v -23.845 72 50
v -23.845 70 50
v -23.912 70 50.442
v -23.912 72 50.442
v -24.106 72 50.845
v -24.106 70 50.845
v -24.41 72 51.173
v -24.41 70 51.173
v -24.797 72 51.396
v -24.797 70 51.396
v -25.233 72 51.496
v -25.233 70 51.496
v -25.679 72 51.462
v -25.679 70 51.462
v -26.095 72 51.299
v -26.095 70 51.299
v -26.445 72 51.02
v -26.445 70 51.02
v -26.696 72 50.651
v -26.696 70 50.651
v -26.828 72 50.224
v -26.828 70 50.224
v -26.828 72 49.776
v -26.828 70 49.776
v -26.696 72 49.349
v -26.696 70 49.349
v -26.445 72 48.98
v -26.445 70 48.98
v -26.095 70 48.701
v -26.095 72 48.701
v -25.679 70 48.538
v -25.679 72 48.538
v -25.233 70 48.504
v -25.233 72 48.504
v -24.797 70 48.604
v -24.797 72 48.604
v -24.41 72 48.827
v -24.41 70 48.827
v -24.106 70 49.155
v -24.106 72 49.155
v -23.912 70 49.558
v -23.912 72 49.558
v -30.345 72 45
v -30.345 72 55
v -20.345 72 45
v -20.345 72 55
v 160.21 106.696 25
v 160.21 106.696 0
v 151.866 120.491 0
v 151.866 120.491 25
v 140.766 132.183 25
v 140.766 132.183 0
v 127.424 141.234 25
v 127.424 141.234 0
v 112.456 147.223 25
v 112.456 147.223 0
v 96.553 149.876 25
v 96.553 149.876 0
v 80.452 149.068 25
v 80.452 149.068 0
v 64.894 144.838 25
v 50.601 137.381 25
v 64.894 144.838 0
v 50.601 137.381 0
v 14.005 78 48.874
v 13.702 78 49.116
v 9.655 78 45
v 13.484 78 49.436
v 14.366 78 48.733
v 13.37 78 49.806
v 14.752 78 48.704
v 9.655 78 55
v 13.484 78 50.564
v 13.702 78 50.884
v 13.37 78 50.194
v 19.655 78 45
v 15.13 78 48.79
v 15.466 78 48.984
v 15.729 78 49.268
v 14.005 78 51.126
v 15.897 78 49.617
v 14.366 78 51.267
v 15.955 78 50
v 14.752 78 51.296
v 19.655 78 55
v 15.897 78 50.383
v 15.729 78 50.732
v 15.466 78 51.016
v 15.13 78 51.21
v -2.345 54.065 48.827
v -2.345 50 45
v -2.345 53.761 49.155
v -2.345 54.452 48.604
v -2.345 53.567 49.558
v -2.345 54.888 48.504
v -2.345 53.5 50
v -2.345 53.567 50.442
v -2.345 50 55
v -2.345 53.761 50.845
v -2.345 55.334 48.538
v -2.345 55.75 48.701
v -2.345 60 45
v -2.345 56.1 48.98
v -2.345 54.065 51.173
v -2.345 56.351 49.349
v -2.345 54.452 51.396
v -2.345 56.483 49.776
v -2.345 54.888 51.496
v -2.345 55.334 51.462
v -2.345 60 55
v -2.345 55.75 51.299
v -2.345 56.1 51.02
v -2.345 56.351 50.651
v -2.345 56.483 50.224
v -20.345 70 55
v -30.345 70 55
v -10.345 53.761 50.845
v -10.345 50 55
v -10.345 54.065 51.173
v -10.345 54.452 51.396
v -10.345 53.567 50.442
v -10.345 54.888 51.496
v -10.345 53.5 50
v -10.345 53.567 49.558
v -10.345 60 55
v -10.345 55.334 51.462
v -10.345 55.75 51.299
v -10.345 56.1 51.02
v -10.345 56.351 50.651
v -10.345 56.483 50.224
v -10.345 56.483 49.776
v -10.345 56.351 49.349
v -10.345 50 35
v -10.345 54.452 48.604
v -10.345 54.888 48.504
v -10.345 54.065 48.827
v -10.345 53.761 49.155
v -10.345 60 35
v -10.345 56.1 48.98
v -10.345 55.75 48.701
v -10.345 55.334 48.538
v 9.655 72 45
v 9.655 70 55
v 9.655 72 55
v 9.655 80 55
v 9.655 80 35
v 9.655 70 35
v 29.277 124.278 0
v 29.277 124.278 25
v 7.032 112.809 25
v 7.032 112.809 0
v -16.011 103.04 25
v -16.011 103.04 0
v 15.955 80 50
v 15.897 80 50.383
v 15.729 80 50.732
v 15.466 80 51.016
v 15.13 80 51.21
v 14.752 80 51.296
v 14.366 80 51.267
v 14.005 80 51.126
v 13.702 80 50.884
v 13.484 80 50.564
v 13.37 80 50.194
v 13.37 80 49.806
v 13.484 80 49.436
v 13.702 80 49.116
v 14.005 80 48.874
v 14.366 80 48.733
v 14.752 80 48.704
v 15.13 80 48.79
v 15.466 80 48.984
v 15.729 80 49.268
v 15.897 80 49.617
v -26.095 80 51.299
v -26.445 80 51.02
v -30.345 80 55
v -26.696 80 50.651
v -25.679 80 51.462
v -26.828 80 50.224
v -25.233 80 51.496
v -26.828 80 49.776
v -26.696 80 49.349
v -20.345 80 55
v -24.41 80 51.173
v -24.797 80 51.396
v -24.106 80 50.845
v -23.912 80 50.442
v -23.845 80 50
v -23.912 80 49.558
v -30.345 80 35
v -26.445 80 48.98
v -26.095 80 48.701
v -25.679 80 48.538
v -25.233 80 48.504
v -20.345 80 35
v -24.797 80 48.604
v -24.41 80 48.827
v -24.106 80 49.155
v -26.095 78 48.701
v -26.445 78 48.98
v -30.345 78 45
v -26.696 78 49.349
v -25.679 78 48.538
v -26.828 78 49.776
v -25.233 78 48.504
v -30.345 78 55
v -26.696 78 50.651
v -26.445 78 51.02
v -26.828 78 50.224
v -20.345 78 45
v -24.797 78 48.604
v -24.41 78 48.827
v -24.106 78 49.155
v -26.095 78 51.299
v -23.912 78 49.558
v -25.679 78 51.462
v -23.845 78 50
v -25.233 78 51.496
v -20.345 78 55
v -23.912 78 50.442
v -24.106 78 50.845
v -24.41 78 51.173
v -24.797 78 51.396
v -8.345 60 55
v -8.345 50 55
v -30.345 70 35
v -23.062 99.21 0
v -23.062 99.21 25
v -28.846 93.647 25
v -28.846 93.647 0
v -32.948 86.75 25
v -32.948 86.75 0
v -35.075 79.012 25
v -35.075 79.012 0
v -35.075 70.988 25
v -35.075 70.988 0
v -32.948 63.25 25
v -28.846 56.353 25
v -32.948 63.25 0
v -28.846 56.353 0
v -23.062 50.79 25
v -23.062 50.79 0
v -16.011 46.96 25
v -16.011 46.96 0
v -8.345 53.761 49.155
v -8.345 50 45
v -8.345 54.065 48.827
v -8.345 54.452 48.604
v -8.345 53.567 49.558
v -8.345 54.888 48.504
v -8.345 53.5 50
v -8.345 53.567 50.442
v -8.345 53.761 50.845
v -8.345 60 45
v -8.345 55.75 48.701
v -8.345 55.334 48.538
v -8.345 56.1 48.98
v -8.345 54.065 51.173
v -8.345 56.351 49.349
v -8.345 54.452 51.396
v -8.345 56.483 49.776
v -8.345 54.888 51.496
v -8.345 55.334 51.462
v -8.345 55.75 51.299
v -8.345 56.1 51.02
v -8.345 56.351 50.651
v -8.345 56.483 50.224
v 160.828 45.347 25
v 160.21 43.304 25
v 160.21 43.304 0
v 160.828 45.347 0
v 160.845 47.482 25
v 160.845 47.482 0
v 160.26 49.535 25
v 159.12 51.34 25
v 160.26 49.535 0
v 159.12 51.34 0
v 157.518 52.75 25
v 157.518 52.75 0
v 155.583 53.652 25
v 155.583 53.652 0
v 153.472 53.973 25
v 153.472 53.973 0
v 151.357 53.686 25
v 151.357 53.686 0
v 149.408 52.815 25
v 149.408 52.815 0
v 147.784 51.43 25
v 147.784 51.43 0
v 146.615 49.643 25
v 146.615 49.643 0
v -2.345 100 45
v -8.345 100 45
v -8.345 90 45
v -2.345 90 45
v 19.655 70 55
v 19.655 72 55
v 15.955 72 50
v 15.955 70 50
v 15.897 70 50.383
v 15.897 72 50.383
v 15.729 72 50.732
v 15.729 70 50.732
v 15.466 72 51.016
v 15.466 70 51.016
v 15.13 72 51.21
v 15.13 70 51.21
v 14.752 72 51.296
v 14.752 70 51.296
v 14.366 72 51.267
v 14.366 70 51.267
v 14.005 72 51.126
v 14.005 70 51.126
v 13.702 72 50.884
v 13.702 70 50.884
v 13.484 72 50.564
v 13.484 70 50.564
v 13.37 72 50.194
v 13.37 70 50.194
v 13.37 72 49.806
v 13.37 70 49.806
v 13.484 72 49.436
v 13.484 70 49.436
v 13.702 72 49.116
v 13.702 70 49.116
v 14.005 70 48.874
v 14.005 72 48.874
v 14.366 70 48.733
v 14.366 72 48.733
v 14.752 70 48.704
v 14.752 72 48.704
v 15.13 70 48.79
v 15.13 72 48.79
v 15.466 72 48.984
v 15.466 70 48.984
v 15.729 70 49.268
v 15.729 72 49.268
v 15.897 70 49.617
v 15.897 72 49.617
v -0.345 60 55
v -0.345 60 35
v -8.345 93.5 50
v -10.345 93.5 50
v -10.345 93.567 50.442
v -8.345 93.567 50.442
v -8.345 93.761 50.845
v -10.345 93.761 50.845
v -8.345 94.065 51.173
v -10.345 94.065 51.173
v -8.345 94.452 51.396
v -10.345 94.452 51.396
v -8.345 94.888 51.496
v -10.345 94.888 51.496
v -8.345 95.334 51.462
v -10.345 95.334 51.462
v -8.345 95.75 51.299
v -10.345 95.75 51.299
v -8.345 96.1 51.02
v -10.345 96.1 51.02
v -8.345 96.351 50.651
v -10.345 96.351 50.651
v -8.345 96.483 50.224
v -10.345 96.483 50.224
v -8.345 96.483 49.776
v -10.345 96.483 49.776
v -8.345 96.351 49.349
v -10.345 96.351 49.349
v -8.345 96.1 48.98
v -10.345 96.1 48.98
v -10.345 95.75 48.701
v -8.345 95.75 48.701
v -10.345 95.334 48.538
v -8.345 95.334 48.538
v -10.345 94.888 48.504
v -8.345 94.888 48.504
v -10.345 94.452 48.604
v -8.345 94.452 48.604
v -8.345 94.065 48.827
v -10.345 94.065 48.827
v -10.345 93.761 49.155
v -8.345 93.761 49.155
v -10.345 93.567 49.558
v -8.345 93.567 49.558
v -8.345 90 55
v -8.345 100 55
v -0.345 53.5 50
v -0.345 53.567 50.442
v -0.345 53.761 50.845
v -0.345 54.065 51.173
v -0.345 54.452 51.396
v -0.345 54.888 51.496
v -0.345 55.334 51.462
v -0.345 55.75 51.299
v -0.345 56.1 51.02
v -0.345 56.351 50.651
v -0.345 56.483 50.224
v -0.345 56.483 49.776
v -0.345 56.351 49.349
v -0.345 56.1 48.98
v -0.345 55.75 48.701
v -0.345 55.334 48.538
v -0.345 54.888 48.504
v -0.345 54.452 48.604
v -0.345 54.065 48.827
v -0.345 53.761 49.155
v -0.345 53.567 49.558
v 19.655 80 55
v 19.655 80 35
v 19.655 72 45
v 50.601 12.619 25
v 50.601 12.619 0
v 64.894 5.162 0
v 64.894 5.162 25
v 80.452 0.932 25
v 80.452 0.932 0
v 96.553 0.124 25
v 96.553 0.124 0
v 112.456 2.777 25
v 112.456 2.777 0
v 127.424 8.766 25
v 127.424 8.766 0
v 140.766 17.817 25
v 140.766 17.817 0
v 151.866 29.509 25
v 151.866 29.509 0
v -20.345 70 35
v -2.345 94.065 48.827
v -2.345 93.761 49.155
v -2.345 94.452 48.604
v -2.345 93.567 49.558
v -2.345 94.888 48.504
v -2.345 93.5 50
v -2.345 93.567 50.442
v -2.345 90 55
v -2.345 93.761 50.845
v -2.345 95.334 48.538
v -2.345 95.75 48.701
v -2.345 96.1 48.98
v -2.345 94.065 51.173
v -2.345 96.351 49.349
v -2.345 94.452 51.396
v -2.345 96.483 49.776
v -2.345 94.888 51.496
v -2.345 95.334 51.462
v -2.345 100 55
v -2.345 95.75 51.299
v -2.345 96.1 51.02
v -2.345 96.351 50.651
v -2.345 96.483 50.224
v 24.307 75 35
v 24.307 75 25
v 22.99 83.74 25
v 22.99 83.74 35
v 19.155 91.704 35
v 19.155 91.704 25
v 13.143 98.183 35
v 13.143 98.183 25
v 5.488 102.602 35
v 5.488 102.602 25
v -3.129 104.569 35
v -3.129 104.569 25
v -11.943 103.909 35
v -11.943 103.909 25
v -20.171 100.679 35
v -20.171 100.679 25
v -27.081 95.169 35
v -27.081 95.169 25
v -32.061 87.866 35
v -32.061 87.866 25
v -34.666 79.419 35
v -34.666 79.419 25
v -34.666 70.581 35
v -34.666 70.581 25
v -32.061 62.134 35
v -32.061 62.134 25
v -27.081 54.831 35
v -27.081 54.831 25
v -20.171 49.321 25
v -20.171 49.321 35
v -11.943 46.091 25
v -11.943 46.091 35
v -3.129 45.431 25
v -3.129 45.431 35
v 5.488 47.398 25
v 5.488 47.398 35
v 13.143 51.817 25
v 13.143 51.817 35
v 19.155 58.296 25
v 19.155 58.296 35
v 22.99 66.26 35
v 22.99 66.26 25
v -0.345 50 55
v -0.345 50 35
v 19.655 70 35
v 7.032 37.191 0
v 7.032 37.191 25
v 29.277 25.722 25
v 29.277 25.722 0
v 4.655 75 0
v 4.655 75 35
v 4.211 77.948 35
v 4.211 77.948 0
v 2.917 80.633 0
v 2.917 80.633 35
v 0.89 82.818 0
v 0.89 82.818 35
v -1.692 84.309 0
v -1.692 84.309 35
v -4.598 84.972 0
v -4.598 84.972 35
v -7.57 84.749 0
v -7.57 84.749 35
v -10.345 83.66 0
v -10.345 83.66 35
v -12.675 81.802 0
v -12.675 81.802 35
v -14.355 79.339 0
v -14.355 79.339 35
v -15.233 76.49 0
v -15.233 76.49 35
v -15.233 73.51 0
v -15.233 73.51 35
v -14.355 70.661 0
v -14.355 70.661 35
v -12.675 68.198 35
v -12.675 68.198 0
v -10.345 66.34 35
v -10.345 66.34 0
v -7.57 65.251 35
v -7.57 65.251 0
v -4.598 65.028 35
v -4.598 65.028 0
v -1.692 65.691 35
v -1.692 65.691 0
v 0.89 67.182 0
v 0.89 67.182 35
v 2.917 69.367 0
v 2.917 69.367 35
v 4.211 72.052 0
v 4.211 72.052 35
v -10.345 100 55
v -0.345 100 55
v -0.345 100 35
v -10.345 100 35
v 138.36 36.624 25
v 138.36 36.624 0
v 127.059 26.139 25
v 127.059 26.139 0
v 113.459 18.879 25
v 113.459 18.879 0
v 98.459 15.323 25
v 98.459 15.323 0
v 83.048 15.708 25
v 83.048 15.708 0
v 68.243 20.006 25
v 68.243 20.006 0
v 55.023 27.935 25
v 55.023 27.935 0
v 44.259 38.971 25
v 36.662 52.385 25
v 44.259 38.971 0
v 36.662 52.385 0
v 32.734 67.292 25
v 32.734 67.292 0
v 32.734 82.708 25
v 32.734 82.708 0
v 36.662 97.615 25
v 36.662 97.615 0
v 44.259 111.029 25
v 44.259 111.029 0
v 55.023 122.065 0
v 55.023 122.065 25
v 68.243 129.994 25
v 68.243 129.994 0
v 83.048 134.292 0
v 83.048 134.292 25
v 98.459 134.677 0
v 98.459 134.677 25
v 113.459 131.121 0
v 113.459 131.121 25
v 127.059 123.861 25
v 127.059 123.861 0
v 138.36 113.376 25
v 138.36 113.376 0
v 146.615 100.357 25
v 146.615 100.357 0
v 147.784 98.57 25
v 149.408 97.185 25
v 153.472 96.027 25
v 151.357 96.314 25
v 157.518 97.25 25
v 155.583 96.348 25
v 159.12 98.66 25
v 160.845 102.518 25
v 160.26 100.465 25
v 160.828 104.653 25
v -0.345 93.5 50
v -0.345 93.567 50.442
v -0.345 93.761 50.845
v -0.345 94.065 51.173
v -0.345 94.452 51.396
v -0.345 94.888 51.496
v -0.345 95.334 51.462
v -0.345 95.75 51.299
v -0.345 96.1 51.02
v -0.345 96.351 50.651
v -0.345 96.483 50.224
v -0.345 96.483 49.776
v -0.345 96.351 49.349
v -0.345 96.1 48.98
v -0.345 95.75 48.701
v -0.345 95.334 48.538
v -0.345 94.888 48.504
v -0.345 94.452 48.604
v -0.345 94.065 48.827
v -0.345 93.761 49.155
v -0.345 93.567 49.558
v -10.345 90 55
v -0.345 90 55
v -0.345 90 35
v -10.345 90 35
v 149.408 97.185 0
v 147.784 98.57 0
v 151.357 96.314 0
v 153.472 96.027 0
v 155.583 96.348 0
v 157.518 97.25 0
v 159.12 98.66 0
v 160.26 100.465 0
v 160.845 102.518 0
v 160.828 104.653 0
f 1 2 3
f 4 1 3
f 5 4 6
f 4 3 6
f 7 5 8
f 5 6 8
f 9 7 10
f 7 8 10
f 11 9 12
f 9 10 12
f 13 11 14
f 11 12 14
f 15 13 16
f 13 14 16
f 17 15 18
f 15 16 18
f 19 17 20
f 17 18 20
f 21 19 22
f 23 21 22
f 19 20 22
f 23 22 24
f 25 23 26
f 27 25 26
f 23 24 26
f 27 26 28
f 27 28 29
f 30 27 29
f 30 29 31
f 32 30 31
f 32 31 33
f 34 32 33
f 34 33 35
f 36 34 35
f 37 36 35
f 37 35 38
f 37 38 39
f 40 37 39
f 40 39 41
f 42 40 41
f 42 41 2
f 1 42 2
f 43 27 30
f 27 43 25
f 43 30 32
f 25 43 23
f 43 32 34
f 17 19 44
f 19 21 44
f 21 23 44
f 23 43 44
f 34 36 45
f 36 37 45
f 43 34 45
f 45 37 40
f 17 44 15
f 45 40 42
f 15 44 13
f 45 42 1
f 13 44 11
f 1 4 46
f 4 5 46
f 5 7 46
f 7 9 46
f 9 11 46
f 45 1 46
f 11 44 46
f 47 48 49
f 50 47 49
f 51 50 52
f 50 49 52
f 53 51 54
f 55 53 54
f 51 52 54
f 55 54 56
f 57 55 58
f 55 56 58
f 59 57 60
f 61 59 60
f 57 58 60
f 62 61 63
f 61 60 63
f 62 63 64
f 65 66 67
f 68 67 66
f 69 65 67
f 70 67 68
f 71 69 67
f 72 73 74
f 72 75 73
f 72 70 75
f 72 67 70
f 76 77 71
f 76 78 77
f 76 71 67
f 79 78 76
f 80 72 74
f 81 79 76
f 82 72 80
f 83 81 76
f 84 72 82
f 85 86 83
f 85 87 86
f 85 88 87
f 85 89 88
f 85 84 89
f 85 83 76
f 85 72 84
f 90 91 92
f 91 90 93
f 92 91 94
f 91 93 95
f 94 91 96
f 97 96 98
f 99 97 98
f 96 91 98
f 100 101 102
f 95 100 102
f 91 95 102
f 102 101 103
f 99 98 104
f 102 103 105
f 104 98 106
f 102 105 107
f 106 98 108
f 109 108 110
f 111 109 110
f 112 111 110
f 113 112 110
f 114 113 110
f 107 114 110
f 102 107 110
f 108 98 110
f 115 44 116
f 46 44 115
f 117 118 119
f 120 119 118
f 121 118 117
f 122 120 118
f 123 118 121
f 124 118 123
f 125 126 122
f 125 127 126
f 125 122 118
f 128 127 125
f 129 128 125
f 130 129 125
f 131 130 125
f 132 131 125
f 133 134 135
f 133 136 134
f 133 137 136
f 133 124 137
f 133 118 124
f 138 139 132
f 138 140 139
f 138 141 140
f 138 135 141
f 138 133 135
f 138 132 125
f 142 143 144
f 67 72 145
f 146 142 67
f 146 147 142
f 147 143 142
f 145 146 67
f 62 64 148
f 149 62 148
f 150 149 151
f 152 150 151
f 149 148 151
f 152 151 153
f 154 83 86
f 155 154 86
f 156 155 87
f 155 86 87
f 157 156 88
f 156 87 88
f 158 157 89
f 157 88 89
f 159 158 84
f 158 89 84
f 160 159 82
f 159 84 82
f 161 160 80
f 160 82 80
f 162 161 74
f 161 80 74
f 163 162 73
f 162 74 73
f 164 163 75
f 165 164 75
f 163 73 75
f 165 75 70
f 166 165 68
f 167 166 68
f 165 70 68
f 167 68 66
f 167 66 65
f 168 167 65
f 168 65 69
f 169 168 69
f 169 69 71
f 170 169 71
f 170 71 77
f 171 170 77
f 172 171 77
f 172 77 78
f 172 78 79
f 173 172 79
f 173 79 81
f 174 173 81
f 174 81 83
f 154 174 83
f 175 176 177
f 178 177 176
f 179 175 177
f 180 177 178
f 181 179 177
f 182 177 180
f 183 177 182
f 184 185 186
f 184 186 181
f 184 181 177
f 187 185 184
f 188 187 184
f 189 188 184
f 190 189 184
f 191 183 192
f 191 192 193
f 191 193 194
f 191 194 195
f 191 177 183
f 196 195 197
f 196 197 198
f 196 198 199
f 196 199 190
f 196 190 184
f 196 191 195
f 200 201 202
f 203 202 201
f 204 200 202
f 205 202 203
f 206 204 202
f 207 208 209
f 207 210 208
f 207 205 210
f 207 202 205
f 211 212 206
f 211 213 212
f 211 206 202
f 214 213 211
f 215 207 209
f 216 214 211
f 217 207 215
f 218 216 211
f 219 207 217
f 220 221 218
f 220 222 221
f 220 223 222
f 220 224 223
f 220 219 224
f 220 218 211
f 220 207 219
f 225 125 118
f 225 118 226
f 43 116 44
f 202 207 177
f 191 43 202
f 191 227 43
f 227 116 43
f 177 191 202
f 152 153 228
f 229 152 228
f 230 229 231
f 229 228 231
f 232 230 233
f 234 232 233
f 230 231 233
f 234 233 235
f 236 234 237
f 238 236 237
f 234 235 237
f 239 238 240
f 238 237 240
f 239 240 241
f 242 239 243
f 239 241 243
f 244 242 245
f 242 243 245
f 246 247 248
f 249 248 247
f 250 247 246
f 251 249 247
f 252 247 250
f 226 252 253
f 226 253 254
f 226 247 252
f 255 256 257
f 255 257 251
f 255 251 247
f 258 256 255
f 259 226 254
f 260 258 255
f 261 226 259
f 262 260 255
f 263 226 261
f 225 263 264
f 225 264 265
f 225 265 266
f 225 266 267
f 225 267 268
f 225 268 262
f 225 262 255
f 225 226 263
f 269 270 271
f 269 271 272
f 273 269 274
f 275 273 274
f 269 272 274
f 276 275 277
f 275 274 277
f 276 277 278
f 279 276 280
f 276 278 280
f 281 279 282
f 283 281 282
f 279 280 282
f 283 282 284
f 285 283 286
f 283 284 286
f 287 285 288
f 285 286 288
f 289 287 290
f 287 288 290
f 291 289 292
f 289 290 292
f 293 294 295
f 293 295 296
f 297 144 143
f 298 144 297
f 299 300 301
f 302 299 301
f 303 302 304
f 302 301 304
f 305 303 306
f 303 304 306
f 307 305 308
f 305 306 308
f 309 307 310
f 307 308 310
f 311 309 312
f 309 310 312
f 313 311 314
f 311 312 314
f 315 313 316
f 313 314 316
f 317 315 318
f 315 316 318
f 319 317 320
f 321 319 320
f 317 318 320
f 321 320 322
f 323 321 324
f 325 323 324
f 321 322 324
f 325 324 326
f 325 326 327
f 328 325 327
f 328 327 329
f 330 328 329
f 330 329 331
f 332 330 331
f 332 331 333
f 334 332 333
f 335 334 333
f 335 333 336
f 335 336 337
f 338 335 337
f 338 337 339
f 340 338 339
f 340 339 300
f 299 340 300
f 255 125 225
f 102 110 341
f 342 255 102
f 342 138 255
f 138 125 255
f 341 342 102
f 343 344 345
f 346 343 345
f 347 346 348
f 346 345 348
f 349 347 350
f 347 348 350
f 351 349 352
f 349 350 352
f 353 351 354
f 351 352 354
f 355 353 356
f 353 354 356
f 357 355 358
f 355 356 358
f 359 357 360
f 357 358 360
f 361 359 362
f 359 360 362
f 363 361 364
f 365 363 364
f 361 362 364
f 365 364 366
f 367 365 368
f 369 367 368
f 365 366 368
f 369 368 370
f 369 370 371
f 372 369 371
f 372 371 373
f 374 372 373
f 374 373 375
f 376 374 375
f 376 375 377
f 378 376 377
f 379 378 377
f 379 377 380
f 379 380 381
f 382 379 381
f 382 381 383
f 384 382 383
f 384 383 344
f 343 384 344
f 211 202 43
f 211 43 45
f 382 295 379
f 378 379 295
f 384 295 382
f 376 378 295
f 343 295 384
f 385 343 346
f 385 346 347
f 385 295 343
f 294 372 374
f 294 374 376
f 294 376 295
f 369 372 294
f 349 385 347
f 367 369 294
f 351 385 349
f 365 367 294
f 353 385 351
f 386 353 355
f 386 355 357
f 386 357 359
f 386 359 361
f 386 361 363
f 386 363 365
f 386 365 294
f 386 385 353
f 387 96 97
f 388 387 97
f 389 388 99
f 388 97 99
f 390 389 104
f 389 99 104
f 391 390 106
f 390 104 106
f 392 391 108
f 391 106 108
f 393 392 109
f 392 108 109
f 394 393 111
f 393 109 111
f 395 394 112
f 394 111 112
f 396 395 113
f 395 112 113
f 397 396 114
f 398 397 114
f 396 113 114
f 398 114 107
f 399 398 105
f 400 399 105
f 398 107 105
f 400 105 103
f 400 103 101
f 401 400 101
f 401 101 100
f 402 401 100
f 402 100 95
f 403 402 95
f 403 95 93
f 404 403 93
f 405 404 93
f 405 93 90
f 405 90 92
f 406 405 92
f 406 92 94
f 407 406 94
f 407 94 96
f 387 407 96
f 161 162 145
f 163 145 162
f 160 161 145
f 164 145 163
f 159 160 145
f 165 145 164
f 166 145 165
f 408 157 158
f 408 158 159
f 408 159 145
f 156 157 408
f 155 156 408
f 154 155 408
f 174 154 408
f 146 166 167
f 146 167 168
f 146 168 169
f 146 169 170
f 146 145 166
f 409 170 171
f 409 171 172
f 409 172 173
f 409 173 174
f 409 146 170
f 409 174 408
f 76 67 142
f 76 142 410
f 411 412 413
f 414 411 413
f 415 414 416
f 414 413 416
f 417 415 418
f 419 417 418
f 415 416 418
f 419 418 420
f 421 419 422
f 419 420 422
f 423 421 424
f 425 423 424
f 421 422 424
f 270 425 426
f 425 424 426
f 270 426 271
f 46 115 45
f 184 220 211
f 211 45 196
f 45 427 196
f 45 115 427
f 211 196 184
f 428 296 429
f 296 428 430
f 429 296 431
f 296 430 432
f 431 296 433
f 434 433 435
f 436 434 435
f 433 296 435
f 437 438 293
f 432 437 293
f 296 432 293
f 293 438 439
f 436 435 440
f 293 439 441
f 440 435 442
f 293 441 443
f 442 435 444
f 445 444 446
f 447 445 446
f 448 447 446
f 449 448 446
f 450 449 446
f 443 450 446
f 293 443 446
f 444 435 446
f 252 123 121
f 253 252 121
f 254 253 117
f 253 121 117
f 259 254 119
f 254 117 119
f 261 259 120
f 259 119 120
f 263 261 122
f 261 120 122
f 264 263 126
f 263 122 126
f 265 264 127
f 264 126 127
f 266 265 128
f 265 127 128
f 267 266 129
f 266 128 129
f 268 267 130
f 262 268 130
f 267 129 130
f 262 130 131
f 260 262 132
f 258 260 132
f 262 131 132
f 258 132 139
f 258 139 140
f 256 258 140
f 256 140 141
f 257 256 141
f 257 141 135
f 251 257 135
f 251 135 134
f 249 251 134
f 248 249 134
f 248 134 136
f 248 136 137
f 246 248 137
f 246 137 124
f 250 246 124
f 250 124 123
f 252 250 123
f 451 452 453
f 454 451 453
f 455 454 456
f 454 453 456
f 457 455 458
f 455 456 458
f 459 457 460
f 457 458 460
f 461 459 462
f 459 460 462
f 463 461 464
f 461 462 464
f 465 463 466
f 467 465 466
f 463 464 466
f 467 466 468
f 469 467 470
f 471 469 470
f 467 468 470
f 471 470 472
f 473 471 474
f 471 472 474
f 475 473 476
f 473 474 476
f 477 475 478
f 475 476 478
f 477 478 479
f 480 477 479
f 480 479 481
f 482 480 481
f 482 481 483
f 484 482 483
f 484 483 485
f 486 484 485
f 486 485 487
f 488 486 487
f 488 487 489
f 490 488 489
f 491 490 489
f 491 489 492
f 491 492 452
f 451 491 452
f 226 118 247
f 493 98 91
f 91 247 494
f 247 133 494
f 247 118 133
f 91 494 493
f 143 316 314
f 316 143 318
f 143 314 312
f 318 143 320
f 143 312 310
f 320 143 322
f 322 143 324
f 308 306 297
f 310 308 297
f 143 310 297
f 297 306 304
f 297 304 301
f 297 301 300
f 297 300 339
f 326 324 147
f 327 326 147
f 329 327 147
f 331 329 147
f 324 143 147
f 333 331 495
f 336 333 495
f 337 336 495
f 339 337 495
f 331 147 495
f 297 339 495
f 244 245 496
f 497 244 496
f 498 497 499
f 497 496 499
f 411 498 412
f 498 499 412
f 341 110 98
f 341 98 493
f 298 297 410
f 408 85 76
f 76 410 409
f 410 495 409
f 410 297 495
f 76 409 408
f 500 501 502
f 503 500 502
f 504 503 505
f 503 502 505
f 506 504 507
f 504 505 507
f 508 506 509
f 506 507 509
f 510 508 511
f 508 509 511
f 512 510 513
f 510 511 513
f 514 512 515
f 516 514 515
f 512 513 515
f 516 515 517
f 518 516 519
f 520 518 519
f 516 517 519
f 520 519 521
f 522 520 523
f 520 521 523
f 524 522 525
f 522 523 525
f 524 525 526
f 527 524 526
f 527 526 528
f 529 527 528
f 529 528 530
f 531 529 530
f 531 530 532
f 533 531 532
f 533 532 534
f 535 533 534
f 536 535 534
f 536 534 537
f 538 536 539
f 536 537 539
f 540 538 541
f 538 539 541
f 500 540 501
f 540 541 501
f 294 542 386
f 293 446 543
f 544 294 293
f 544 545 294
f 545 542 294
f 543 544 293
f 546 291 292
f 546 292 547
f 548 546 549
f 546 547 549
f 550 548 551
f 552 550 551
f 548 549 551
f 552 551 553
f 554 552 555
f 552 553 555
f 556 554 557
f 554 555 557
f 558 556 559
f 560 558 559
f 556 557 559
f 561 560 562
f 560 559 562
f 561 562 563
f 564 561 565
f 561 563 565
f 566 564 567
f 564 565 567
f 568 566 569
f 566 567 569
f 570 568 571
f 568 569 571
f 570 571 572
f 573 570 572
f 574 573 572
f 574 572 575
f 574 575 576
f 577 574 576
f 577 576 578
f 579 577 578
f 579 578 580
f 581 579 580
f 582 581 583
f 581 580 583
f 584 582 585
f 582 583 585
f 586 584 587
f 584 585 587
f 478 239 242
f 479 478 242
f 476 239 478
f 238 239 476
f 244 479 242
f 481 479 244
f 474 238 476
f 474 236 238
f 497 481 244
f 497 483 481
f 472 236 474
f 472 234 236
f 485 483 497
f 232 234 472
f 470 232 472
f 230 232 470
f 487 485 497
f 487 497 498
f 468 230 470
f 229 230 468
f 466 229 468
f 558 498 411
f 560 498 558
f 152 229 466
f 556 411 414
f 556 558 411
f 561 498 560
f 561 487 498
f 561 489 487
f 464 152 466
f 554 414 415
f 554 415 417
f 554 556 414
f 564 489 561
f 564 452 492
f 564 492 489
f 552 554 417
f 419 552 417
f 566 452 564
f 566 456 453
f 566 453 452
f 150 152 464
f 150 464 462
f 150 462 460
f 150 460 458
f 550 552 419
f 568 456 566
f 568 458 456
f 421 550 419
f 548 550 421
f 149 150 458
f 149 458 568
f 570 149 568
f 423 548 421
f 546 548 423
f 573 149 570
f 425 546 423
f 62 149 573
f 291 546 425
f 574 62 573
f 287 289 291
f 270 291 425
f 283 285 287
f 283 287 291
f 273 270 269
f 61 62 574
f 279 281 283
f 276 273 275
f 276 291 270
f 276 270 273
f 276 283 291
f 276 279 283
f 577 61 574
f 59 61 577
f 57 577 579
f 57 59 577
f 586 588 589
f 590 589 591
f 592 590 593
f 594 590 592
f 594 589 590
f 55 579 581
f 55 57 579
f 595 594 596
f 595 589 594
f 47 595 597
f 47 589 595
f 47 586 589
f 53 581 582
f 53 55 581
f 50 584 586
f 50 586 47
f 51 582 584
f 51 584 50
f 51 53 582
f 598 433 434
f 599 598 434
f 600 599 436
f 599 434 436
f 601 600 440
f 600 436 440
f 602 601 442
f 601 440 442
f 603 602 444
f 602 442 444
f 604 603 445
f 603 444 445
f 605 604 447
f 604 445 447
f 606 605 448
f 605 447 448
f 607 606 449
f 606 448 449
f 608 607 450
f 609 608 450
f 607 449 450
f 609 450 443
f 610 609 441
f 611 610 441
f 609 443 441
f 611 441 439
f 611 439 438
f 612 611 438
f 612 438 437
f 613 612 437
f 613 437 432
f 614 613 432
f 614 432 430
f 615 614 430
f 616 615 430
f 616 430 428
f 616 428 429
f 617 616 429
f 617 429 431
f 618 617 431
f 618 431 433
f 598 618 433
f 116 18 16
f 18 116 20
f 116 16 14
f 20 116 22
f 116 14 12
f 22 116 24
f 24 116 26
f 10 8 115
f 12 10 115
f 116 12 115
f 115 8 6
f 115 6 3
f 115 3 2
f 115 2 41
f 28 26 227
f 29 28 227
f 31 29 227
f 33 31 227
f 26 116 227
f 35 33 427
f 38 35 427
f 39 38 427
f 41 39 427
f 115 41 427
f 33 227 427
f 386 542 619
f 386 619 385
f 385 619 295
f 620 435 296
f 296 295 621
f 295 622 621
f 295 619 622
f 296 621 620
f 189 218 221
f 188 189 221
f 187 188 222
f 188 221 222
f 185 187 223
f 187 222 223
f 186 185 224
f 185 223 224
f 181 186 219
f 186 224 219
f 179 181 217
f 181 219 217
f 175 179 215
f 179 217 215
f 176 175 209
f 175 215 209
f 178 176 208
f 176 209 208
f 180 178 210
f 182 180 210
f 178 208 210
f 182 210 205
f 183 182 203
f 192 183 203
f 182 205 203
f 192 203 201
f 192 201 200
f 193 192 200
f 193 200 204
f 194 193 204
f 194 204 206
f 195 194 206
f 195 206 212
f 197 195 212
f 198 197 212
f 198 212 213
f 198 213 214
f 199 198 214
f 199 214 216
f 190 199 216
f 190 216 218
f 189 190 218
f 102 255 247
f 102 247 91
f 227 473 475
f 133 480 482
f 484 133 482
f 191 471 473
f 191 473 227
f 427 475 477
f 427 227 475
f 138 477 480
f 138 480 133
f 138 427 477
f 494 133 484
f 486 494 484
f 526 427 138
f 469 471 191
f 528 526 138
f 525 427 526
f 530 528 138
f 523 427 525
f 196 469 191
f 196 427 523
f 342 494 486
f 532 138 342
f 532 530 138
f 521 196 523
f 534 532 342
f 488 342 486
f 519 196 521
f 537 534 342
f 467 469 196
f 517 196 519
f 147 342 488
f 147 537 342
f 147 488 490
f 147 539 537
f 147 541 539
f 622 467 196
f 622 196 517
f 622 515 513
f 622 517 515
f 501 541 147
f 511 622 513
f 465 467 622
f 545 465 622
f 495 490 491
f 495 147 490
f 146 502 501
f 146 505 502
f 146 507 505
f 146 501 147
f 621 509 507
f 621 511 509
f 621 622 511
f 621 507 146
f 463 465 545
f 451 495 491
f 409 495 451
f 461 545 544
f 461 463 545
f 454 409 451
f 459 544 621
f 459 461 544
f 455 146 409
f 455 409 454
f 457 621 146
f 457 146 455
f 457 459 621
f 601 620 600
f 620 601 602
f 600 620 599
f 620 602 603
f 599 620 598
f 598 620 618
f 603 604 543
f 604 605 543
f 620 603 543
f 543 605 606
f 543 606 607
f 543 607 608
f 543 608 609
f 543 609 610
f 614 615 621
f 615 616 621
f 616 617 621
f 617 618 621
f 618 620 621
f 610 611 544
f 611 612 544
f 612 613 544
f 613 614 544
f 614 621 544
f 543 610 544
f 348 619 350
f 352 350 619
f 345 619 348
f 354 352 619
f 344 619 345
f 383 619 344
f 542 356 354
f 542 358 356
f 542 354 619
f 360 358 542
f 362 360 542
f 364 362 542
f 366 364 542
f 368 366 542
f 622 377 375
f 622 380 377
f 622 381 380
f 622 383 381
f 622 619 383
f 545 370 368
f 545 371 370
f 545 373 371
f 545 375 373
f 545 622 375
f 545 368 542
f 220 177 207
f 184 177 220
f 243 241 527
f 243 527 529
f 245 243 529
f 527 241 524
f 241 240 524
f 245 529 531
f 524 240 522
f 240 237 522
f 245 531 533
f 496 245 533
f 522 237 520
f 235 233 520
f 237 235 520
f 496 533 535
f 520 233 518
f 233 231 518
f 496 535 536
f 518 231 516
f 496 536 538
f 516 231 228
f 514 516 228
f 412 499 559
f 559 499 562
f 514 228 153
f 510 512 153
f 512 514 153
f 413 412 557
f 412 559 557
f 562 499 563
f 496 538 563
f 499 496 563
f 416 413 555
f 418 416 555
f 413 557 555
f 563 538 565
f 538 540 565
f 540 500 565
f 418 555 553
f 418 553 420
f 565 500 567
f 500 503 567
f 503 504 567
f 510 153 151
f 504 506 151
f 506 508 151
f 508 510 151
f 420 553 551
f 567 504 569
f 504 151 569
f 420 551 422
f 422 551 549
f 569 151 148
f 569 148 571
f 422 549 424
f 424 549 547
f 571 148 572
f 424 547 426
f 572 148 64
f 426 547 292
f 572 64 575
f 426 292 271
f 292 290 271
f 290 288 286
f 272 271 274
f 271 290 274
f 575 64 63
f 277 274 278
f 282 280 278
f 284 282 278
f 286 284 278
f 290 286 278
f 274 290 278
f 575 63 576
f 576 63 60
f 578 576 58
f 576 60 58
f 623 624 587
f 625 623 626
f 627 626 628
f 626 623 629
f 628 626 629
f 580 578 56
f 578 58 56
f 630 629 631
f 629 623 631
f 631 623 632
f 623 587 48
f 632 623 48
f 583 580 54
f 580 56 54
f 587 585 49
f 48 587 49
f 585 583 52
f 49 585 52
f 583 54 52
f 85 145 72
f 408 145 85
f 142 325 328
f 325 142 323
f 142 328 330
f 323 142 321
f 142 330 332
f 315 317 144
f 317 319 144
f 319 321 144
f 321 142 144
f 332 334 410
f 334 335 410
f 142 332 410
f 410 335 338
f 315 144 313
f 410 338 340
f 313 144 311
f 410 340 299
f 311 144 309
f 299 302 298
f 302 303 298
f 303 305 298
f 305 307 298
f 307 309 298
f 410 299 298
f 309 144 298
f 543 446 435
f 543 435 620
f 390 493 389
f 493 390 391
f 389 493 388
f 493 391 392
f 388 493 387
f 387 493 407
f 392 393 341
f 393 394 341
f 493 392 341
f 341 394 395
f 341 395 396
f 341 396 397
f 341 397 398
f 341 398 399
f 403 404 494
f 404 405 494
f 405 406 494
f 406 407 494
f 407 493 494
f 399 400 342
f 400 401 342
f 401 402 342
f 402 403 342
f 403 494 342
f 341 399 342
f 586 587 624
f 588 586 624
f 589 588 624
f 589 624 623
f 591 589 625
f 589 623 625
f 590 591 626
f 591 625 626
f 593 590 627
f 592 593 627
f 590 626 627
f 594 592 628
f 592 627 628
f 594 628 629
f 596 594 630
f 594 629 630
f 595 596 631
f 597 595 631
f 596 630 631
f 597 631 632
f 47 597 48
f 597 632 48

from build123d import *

# Parameters (mm, degrees)
BOSS_EXTRUDE1_DEPTH = 25
SKETCH1_3_R         = 29.652029199
BOSS_EXTRUDE2_DEPTH = 35
SKETCH3_R           = 10
CUT_EXTRUDE1_DEPTH  = 35
SKETCH4_W           = 10
SKETCH4_H           = 10
BOSS_EXTRUDE3_DEPTH = 20
SKETCH5_W           = 6
SKETCH5_H           = 10
SKETCH5_W_2         = 10
SKETCH5_H_2         = 6
CUT_EXTRUDE2_DEPTH  = 10
SKETCH6_R           = 1.3
SKETCH6_R_2         = 1.5
CUT_EXTRUDE3_DEPTH  = 10
SKETCH7_R           = 1.5
CUT_EXTRUDE4_DEPTH  = 10


with BuildPart() as part:
    # Sketch1 → Boss-Extrude1 (new body)
    with BuildSketch(Plane.XY):
        with BuildLine():
            ThreePointArc((50.600725893, 12.618751535), (112.455741461, 2.776716043), (160.210090254, 43.303630369))
            ThreePointArc((160.210090254, 43.303630369), (156.582418814, 53.270575735), (146.615473448, 49.642904296))
            ThreePointArc((146.615473448, 49.642904296), (32.237006226, 75), (146.615473448, 100.357095704))
            ThreePointArc((146.615473448, 100.357095704), (156.582418814, 96.729424265), (160.210090254, 106.696369631))
            ThreePointArc((160.210090254, 106.696369631), (112.455741461, 147.223283957), (50.600725893, 137.381248465))
            ThreePointArc((50.600725893, 137.381248465), (18.262261371, 118.334618782), (-16.010570265, 103.040064143))
            ThreePointArc((-16.010570265, 103.040064143), (-35.344980602, 75), (-16.010570265, 46.959935857))
            ThreePointArc((-16.010570265, 46.959935857), (18.262261371, 31.665381218), (50.600725893, 12.618751535))
        make_face()
    extrude(amount=BOSS_EXTRUDE1_DEPTH)

    # Sketch1<3> → Boss-Extrude2 (add)
    with BuildSketch(Plane.XY):
        with Locations((-5.344980602, 75)):
            Circle(SKETCH1_3_R)
    extrude(amount=BOSS_EXTRUDE2_DEPTH)

    # Sketch3 → Cut-Extrude1 (cut)
    with BuildSketch(Plane.XY.offset(35)):
        with Locations((-5.344980602, 75)):
            Circle(SKETCH3_R)
    extrude(amount=-CUT_EXTRUDE1_DEPTH, mode=Mode.SUBTRACT)

    # Sketch4 → Boss-Extrude3 (add)
    with BuildSketch(Plane.XY.offset(35)):
        with Locations((14.655019398, 75)):
            Rectangle(SKETCH4_W, SKETCH4_H)
        with Locations((-5.344980602, 55)):
            Rectangle(SKETCH4_W, SKETCH4_H)
        with Locations((-5.344980602, 95)):
            Rectangle(SKETCH4_W, SKETCH4_H)
        with Locations((-25.344980602, 75)):
            Rectangle(SKETCH4_W, SKETCH4_H)
    extrude(amount=BOSS_EXTRUDE3_DEPTH)

    # Sketch5 → Cut-Extrude2 (cut)
    with BuildSketch(Plane.XY.offset(55)):
        with Locations((-5.344980602, 95)):
            Rectangle(SKETCH5_W, SKETCH5_H)
        with Locations((14.655019398, 75)):
            Rectangle(SKETCH5_W_2, SKETCH5_H_2)
        with Locations((-5.344980602, 55)):
            Rectangle(SKETCH5_W, SKETCH5_H)
        with Locations((-25.344980602, 75)):
            Rectangle(SKETCH5_W_2, SKETCH5_H_2)
    extrude(amount=-CUT_EXTRUDE2_DEPTH, mode=Mode.SUBTRACT)

    # Sketch6 → Cut-Extrude3 (cut)
    with BuildSketch(Plane(origin=(0, 70, 0), x_dir=(-1, 0, 0), z_dir=(0, -1, 0))):
        with Locations(Location((-14.655019398, -50, 0), (0, 0, 180))):
            Circle(SKETCH6_R)
        with Locations(Location((25.344980602, -50, 0), (0, 0, 180))):
            Circle(SKETCH6_R_2)
    extrude(amount=-CUT_EXTRUDE3_DEPTH, mode=Mode.SUBTRACT)

    # Sketch7 → Cut-Extrude4 (cut)
    with BuildSketch(Plane.ZY.offset(10.344980602)):
        with Locations(Location((50, 55, 0), (0, 0, 270))):
            Circle(SKETCH7_R)
        with Locations(Location((50, 95, 0), (0, 0, 270))):
            Circle(SKETCH7_R)
    extrude(amount=-CUT_EXTRUDE4_DEPTH, mode=Mode.SUBTRACT)


solid = part.part
